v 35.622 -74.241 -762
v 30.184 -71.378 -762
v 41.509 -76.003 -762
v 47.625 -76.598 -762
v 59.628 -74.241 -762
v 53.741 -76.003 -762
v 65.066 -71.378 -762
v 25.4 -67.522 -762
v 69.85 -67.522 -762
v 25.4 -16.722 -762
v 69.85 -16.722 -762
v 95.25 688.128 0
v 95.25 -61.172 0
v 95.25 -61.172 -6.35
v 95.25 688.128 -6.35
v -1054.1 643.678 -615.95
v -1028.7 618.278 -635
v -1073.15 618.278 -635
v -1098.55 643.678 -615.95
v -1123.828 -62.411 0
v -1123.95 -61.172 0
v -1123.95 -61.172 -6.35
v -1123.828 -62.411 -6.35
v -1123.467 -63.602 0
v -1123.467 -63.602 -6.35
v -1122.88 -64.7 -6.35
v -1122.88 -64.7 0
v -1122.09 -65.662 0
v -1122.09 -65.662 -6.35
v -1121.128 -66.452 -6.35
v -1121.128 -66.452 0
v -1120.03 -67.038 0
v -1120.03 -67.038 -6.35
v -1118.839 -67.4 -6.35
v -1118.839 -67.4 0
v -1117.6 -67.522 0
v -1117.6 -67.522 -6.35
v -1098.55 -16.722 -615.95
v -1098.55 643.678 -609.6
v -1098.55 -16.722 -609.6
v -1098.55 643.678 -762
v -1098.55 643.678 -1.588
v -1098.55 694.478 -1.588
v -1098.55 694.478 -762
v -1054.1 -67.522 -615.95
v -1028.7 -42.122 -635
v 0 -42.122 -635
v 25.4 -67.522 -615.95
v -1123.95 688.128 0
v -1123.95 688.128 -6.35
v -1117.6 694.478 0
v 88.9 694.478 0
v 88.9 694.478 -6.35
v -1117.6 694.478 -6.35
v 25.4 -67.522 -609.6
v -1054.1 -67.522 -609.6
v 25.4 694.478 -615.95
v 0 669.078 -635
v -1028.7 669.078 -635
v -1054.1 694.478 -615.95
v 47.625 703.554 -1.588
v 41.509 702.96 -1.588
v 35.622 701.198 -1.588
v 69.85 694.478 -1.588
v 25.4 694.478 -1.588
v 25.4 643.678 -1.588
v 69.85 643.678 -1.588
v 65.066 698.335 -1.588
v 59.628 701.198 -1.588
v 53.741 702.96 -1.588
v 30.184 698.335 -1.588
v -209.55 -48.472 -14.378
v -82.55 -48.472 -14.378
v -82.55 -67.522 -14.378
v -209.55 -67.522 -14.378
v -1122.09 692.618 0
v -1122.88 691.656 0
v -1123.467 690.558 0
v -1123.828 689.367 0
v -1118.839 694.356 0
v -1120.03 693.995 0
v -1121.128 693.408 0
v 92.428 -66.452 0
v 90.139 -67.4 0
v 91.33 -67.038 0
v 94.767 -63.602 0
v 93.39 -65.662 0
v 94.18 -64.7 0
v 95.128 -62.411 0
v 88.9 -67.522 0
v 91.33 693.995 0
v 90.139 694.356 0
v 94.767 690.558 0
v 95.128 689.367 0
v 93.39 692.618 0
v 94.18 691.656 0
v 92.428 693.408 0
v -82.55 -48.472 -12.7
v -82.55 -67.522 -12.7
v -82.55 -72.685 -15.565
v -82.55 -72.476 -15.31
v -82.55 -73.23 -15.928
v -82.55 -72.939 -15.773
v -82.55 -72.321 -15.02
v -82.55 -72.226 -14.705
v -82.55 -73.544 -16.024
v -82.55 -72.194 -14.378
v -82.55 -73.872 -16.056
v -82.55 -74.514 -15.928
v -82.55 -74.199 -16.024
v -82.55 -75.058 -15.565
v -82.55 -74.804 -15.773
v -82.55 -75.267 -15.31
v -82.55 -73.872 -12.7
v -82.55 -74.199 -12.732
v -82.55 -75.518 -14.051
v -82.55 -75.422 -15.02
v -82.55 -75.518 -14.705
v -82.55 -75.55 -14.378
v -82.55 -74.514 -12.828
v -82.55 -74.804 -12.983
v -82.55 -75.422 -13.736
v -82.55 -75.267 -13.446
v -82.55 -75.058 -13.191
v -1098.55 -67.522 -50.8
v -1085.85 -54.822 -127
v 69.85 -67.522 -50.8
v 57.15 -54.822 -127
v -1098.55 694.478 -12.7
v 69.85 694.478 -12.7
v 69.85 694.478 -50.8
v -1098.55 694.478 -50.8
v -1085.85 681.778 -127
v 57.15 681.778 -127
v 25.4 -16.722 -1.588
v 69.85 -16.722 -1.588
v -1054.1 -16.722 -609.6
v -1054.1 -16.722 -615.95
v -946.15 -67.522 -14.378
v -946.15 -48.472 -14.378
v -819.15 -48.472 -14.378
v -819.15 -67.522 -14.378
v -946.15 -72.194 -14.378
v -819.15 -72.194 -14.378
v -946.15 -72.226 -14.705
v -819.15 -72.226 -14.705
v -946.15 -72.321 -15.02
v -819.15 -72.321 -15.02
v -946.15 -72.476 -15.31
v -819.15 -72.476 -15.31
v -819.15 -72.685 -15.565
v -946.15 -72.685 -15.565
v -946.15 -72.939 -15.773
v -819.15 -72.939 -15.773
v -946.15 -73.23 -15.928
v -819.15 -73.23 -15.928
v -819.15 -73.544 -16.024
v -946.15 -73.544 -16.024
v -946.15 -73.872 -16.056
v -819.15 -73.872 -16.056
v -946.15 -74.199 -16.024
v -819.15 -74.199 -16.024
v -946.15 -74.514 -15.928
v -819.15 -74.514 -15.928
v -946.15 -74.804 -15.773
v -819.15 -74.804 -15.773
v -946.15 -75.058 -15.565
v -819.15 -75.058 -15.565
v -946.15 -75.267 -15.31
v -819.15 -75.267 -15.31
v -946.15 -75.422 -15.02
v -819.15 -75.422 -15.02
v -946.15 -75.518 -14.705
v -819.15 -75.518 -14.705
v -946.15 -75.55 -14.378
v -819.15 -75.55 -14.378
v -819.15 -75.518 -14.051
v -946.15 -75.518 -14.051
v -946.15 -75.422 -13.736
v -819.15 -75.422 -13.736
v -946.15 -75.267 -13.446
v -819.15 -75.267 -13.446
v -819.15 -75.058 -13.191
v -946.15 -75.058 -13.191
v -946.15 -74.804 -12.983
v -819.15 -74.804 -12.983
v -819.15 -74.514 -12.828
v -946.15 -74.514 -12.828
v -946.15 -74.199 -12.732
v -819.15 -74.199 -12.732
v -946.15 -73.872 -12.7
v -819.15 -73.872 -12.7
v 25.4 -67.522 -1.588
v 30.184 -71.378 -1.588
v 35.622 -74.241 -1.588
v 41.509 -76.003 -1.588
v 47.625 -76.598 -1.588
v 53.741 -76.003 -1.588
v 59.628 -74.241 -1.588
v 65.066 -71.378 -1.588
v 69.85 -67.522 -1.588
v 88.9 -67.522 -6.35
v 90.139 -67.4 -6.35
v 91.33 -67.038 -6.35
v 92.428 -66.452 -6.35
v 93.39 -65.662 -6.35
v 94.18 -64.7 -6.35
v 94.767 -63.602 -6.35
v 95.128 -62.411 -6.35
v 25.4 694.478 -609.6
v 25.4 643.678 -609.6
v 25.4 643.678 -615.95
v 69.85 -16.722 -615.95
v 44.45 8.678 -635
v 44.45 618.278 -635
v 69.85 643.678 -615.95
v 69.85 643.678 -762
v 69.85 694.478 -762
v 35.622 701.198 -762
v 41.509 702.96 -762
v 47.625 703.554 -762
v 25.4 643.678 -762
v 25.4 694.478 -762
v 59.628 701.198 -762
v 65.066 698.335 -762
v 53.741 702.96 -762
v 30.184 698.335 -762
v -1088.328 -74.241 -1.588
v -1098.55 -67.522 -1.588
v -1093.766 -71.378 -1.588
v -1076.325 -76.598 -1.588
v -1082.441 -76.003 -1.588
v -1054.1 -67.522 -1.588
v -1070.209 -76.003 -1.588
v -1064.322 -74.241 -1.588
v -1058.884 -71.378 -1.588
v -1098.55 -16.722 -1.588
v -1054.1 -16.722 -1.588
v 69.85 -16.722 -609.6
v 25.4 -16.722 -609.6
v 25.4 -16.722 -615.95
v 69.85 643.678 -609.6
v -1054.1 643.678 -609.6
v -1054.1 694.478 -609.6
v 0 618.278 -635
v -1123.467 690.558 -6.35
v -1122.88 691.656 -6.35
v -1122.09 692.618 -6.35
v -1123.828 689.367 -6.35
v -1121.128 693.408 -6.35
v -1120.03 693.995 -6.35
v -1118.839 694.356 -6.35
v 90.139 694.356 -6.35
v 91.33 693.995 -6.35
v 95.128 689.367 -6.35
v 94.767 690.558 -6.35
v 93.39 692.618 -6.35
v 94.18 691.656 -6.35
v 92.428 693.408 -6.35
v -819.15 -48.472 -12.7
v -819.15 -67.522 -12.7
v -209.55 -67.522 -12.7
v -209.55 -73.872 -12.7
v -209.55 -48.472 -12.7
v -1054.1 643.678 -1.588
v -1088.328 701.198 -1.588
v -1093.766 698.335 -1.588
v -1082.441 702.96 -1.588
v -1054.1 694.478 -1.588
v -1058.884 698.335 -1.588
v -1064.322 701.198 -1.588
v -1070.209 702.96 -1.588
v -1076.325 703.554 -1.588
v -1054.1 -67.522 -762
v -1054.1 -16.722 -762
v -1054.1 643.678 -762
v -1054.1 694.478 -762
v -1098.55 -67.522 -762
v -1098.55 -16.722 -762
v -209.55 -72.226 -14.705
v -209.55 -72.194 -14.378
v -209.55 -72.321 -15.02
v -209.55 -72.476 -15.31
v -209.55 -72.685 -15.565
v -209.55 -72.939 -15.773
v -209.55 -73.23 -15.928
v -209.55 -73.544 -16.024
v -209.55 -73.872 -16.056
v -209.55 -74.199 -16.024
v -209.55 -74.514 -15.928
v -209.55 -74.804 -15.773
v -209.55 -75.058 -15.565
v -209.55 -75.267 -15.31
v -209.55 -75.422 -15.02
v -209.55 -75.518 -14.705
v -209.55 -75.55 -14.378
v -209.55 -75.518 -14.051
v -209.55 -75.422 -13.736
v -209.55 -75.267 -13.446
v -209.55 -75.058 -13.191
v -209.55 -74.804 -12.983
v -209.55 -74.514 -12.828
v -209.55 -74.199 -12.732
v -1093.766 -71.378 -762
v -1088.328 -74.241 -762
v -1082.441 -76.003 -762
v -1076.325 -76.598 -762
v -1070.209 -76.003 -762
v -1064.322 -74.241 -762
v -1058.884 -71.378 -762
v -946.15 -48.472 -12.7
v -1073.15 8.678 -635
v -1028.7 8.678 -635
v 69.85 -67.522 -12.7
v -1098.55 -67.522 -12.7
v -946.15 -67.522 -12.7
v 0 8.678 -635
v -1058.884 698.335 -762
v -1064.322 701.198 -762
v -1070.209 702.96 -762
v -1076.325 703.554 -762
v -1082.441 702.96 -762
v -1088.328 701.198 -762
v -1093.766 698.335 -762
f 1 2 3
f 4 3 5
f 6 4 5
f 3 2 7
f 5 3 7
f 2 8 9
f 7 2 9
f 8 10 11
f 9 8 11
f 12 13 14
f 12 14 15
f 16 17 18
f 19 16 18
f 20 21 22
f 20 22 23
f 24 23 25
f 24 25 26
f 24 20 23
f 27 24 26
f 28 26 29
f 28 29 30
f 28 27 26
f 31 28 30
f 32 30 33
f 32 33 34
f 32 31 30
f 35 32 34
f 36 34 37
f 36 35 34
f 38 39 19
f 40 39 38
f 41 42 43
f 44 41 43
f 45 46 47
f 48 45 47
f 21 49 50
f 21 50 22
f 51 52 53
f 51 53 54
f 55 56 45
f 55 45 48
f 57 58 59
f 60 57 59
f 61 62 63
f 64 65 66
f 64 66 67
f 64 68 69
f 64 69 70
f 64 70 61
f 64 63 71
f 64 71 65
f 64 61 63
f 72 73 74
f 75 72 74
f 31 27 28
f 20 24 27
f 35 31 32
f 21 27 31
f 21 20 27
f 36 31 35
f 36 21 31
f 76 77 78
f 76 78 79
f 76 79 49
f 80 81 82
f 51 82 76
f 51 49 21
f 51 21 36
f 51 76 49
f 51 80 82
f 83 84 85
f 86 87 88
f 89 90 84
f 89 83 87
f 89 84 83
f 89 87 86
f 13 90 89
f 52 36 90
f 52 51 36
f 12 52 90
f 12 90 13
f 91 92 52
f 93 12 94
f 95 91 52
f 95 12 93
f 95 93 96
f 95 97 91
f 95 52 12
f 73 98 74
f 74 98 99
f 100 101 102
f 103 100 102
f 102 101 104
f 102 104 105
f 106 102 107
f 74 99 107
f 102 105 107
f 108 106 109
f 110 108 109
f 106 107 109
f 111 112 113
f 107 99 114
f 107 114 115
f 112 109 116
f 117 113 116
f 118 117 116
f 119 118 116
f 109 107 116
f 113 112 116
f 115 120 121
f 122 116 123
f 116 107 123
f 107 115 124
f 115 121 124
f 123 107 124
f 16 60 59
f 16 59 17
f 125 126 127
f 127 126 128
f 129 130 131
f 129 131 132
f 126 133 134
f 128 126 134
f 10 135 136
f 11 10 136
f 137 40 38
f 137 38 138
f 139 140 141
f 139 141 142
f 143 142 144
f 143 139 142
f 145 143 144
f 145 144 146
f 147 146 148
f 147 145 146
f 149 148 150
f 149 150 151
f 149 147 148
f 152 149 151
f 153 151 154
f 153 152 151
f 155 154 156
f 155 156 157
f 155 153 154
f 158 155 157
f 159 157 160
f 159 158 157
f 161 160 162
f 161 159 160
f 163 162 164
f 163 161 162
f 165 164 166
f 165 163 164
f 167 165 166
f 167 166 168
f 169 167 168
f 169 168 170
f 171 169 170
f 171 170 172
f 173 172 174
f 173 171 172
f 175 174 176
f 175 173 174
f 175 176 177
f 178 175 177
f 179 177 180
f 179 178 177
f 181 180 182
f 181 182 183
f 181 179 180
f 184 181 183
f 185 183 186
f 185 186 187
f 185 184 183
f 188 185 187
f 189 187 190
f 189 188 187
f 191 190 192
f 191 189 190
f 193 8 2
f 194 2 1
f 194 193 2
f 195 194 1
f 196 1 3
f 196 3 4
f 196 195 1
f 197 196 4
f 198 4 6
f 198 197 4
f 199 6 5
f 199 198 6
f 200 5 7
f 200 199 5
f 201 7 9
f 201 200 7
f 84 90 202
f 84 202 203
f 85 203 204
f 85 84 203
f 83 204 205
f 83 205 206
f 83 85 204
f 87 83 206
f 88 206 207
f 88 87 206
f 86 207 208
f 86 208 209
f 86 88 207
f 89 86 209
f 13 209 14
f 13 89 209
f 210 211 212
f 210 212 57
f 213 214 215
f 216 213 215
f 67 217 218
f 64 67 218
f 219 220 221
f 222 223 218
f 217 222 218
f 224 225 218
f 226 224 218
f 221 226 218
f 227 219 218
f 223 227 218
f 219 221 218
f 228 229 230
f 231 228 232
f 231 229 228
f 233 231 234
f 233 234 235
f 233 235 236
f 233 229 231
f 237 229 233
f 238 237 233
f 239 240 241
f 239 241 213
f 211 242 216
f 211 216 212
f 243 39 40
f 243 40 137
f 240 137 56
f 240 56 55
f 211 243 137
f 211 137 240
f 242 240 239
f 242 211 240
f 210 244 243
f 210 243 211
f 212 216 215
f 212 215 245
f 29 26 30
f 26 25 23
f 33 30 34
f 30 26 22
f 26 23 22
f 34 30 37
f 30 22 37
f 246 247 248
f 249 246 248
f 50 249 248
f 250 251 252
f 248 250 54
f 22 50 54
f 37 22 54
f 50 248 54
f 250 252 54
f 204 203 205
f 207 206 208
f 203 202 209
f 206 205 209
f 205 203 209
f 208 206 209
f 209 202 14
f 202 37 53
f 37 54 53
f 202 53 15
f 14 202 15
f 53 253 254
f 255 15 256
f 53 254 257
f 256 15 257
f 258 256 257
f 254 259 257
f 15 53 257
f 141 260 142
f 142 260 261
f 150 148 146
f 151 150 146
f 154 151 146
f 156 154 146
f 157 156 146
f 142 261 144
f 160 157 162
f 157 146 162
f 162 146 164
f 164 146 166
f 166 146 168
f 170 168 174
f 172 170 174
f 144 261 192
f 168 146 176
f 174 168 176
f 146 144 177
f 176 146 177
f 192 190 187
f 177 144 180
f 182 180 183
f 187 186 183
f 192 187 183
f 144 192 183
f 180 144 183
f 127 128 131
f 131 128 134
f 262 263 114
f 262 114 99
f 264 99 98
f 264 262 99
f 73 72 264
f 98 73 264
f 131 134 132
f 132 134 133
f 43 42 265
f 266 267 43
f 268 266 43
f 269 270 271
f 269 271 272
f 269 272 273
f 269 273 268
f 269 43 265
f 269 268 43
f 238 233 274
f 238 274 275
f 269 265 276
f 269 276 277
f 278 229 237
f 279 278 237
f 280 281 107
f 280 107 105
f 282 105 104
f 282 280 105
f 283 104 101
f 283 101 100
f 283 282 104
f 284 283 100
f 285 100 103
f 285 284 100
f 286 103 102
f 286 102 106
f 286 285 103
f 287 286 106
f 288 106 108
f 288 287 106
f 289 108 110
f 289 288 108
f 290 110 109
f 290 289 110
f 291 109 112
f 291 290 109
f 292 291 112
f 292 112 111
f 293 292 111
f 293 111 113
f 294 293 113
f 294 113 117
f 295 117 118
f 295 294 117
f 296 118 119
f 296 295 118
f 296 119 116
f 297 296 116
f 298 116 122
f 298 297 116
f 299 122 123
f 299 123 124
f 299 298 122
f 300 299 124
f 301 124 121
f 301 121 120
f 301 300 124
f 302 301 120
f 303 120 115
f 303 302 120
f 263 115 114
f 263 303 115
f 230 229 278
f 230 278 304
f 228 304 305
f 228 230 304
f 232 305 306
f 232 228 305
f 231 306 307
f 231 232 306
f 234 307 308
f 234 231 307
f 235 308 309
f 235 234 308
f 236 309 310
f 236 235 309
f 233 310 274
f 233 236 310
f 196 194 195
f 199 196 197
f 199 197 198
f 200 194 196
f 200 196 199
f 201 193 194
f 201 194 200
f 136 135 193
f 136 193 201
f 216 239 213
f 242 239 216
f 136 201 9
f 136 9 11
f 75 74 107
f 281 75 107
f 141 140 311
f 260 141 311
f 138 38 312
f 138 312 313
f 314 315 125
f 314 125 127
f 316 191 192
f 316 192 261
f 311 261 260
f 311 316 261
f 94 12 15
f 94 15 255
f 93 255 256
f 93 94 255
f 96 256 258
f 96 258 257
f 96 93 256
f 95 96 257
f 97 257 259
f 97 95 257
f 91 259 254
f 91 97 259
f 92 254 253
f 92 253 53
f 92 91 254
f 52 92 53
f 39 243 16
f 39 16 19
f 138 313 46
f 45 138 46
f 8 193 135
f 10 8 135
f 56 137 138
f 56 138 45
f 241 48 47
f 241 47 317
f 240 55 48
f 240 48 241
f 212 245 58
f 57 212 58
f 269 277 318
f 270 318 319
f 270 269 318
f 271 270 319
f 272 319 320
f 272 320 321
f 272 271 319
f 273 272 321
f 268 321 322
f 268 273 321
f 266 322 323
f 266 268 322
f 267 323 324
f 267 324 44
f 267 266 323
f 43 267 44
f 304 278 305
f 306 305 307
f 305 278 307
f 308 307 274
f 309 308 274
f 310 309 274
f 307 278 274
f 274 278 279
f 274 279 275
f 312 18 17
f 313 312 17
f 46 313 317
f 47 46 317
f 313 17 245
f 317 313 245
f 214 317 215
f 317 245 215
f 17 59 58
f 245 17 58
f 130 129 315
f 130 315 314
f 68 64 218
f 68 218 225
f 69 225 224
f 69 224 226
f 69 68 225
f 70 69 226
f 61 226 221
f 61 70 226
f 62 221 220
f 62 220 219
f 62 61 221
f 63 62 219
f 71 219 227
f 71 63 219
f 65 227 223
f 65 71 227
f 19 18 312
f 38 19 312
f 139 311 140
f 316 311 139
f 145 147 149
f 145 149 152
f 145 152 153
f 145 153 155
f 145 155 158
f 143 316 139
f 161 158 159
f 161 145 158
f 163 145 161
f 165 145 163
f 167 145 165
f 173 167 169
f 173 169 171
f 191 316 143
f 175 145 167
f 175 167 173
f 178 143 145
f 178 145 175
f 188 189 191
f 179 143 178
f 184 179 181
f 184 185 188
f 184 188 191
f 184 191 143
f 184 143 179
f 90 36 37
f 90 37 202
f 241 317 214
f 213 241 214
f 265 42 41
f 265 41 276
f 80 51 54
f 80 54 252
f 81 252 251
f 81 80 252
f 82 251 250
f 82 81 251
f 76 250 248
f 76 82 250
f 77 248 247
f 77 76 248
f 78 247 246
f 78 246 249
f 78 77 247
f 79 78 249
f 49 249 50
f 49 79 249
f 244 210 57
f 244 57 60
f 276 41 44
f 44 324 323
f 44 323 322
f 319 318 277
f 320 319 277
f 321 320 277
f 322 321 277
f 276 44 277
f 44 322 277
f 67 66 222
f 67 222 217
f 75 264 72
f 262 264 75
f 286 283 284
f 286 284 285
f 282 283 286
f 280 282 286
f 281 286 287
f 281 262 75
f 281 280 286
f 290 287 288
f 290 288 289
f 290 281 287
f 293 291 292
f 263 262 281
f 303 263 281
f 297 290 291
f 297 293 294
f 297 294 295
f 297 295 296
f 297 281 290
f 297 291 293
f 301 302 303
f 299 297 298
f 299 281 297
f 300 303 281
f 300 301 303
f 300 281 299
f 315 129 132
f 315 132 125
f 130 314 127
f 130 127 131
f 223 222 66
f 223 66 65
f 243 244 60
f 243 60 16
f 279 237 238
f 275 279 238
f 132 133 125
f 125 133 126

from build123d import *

# Parameters (mm, degrees)
F0_W     = 44.45
F0_H     = 50.8
F1_DEPTH = 6.35
F2_START = -1.5875
F2_DEPTH = 760.4125
F3_START = -12.7
F3_DEPTH = 114.3
F5_START = -152.4
F4_W     = 19.05
F4_H     = 1.6780719161
F5_DEPTH = 127
F6_START = -889
F6_DEPTH = 127
F7_SIZE2 = 12.7
F7_SIZE  = 76.2
F8_START = -609.6
F8_DEPTH = 25.4
F9_SIZE2 = 25.4
F9_SIZE  = 19.05


with BuildPart() as f1:
    # F0 (on Top) → F1 (new body)
    with BuildSketch(Plane.XY):
        with Locations((-1076.325, -42.1217211246)):
            Rectangle(F0_W, F0_H)
        with BuildLine():
            Line((-1098.55, 694.4782788754), (-1117.6, 694.4782788754))
            ThreePointArc((-1117.6, 694.4782788754), (-1122.0901280605, 692.6184069359), (-1123.95, 688.1282788754))
            Line((-1123.95, 688.1282788754), (-1123.95, -61.1717211246))
            ThreePointArc((-1123.95, -61.1717211246), (-1122.0901280605, -65.6618491852), (-1117.6, -67.5217211246))
            Line((-1117.6, -67.5217211246), (-1098.55, -67.5217211246))
            Line((-1098.55, -67.5217211246), (-1098.55, -16.7217211246))
            Line((-1098.55, -16.7217211246), (-1098.55, 643.6782788754))
            Line((-1098.55, 643.6782788754), (-1098.55, 694.4782788754))
        make_face()
        with Locations((-1076.325, 669.0782788754)):
            Rectangle(F0_W, F0_H)
        with Locations((47.625, 669.0782788754)):
            Rectangle(F0_W, F0_H)
        with Locations((47.625, -42.1217211246)):
            Rectangle(F0_W, F0_H)
        Polygon((25.4, 694.4782788754), (-1054.1, 694.4782788754), (-1054.1, 643.6782788754), (-1098.55, 643.6782788754), (-1098.55, -16.7217211246), (-1054.1, -16.7217211246), (-1054.1, -67.5217211246), (25.4, -67.5217211246), (25.4, -16.7217211246), (69.85, -16.7217211246), (69.85, 643.6782788754), (25.4, 643.6782788754), align=None)
        with BuildLine():
            Line((88.9, 694.4782788754), (69.85, 694.4782788754))
            Line((69.85, 694.4782788754), (69.85, 643.6782788754))
            Line((69.85, 643.6782788754), (69.85, -16.7217211246))
            Line((69.85, -16.7217211246), (69.85, -67.5217211246))
            Line((69.85, -67.5217211246), (88.9, -67.5217211246))
            ThreePointArc((88.9, -67.5217211246), (93.3901280605, -65.6618491852), (95.25, -61.1717211246))
            Line((95.25, -61.1717211246), (95.25, 688.1282788754))
            ThreePointArc((95.25, 688.1282788754), (93.3901280605, 692.6184069359), (88.9, 694.4782788754))
        make_face()
    extrude(amount=-F1_DEPTH)


with BuildPart() as f2:
    # F0 (on Top) → F2 (new body)
    with BuildSketch(Plane.XY.offset(F2_START)):
        with BuildLine():
            Line((-1054.1, -67.5217211246), (-1098.55, -67.5217211246))
            ThreePointArc((-1098.55, -67.5217211246), (-1076.325, -76.597685864), (-1054.1, -67.5217211246))
        make_face()
        with Locations((-1076.325, -42.1217211246)):
            Rectangle(F0_W, F0_H)
    extrude(amount=-F2_DEPTH)


with BuildPart() as f2b:
    # F0 (on Top) → F2, piece 2 (new body)
    with BuildSketch(Plane.XY.offset(F2_START)):
        with BuildLine():
            ThreePointArc((-1054.1, 694.4782788754), (-1076.325, 703.5542436147), (-1098.55, 694.4782788754))
            Line((-1098.55, 694.4782788754), (-1054.1, 694.4782788754))
        make_face()
        with Locations((-1076.325, 669.0782788754)):
            Rectangle(F0_W, F0_H)
    extrude(amount=-F2_DEPTH)


with BuildPart() as f2c:
    # F0 (on Top) → F2, piece 3 (new body)
    with BuildSketch(Plane.XY.offset(F2_START)):
        with Locations((47.625, -42.1217211246)):
            Rectangle(F0_W, F0_H)
        with BuildLine():
            Line((69.85, -67.5217211246), (25.4, -67.5217211246))
            ThreePointArc((25.4, -67.5217211246), (47.625, -76.597685864), (69.85, -67.5217211246))
        make_face()
    extrude(amount=-F2_DEPTH)


with BuildPart() as f2d:
    # F0 (on Top) → F2, piece 4 (new body)
    with BuildSketch(Plane.XY.offset(F2_START)):
        with Locations((47.625, 669.0782788754)):
            Rectangle(F0_W, F0_H)
        with BuildLine():
            ThreePointArc((69.85, 694.4782788754), (47.625, 703.5542436147), (25.4, 694.4782788754))
            Line((25.4, 694.4782788754), (69.85, 694.4782788754))
        make_face()
    extrude(amount=-F2_DEPTH)


with BuildPart() as f3:
    # F0 (on Top) → F3 (new body)
    with BuildSketch(Plane.XY.offset(F3_START)):
        Polygon((25.4, 694.4782788754), (-1054.1, 694.4782788754), (-1054.1, 643.6782788754), (-1098.55, 643.6782788754), (-1098.55, -16.7217211246), (-1054.1, -16.7217211246), (-1054.1, -67.5217211246), (25.4, -67.5217211246), (25.4, -16.7217211246), (69.85, -16.7217211246), (69.85, 643.6782788754), (25.4, 643.6782788754), align=None)
        with Locations((-1076.325, -42.1217211246)):
            Rectangle(F0_W, F0_H)
        with Locations((-1076.325, 669.0782788754)):
            Rectangle(F0_W, F0_H)
        with Locations((47.625, 669.0782788754)):
            Rectangle(F0_W, F0_H)
        with Locations((47.625, -42.1217211246)):
            Rectangle(F0_W, F0_H)
    extrude(amount=-F3_DEPTH)

    # F7
    f7_edges = [f3.edges().sort_by_distance(p)[0] for p in [
        (-1098.55, 313.478279, -127),
        (-514.35, -67.521721, -127),
        (69.85, 313.478279, -127),
        (-514.35, 694.478279, -127),
    ]]
    chamfer(f7_edges, length=F7_SIZE, length2=F7_SIZE2)


with BuildPart() as f5:
    # F4 (on face) → F5 (new body)
    with BuildSketch(Plane(origin=(-1098.55, 0, 0), x_dir=(0, -1, 0), z_dir=(-1, 0, 0)).offset(F5_START)):
        with BuildLine():
            ThreePointArc((72.1936492085, -14.3780719161), (75.0582971558, -15.5646479473), (73.8717211246, -12.7))
            Line((73.8717211246, -12.7), (73.8717211246, -14.3780719161))
            Line((73.8717211246, -14.3780719161), (72.1936492085, -14.3780719161))
        make_face()
        Polygon((73.8717211246, -12.7), (67.5217211246, -12.7), (67.5217211246, -14.3780719161), (72.1936492085, -14.3780719161), (73.8717211246, -14.3780719161), align=None)
        with Locations((57.9967211246, -13.5390359581)):
            Rectangle(F4_W, F4_H)
    extrude(amount=-F5_DEPTH)


with BuildPart() as f6:
    # F4 (on face) → F6 (new body)
    with BuildSketch(Plane(origin=(-1098.55, 0, 0), x_dir=(0, -1, 0), z_dir=(-1, 0, 0)).offset(F6_START)):
        with Locations((57.9967211246, -13.5390359581)):
            Rectangle(F4_W, F4_H)
        Polygon((73.8717211246, -12.7), (67.5217211246, -12.7), (67.5217211246, -14.3780719161), (72.1936492085, -14.3780719161), (73.8717211246, -14.3780719161), align=None)
        with BuildLine():
            ThreePointArc((72.1936492085, -14.3780719161), (75.0582971558, -15.5646479473), (73.8717211246, -12.7))
            Line((73.8717211246, -12.7), (73.8717211246, -14.3780719161))
            Line((73.8717211246, -14.3780719161), (72.1936492085, -14.3780719161))
        make_face()
    extrude(amount=-F6_DEPTH)


with BuildPart() as f8:
    # F0 (on Top) → F8 (new body)
    with BuildSketch(Plane.XY.offset(F8_START)):
        Polygon((25.4, 694.4782788754), (-1054.1, 694.4782788754), (-1054.1, 643.6782788754), (-1098.55, 643.6782788754), (-1098.55, -16.7217211246), (-1054.1, -16.7217211246), (-1054.1, -67.5217211246), (25.4, -67.5217211246), (25.4, -16.7217211246), (69.85, -16.7217211246), (69.85, 643.6782788754), (25.4, 643.6782788754), align=None)
    extrude(amount=-F8_DEPTH)

    # F9
    f9_edges = [f8.edges().sort_by_distance(p)[0] for p in [
        (-514.35, 694.478279, -635),
        (-1054.1, 669.078279, -635),
        (-1076.325, 643.678279, -635),
        (-1098.55, 313.478279, -635),
        (-1076.325, -16.721721, -635),
        (-1054.1, -42.121721, -635),
        (-514.35, -67.521721, -635),
        (25.4, -42.121721, -635),
        (47.625, -16.721721, -635),
        (69.85, 313.478279, -635),
        (47.625, 643.678279, -635),
        (25.4, 669.078279, -635),
    ]]
    chamfer(f9_edges, length=F9_SIZE, length2=F9_SIZE2)


solid = Compound([f1.part, f2.part, f2b.part, f2c.part, f2d.part, f3.part, f5.part, f6.part, f8.part])
